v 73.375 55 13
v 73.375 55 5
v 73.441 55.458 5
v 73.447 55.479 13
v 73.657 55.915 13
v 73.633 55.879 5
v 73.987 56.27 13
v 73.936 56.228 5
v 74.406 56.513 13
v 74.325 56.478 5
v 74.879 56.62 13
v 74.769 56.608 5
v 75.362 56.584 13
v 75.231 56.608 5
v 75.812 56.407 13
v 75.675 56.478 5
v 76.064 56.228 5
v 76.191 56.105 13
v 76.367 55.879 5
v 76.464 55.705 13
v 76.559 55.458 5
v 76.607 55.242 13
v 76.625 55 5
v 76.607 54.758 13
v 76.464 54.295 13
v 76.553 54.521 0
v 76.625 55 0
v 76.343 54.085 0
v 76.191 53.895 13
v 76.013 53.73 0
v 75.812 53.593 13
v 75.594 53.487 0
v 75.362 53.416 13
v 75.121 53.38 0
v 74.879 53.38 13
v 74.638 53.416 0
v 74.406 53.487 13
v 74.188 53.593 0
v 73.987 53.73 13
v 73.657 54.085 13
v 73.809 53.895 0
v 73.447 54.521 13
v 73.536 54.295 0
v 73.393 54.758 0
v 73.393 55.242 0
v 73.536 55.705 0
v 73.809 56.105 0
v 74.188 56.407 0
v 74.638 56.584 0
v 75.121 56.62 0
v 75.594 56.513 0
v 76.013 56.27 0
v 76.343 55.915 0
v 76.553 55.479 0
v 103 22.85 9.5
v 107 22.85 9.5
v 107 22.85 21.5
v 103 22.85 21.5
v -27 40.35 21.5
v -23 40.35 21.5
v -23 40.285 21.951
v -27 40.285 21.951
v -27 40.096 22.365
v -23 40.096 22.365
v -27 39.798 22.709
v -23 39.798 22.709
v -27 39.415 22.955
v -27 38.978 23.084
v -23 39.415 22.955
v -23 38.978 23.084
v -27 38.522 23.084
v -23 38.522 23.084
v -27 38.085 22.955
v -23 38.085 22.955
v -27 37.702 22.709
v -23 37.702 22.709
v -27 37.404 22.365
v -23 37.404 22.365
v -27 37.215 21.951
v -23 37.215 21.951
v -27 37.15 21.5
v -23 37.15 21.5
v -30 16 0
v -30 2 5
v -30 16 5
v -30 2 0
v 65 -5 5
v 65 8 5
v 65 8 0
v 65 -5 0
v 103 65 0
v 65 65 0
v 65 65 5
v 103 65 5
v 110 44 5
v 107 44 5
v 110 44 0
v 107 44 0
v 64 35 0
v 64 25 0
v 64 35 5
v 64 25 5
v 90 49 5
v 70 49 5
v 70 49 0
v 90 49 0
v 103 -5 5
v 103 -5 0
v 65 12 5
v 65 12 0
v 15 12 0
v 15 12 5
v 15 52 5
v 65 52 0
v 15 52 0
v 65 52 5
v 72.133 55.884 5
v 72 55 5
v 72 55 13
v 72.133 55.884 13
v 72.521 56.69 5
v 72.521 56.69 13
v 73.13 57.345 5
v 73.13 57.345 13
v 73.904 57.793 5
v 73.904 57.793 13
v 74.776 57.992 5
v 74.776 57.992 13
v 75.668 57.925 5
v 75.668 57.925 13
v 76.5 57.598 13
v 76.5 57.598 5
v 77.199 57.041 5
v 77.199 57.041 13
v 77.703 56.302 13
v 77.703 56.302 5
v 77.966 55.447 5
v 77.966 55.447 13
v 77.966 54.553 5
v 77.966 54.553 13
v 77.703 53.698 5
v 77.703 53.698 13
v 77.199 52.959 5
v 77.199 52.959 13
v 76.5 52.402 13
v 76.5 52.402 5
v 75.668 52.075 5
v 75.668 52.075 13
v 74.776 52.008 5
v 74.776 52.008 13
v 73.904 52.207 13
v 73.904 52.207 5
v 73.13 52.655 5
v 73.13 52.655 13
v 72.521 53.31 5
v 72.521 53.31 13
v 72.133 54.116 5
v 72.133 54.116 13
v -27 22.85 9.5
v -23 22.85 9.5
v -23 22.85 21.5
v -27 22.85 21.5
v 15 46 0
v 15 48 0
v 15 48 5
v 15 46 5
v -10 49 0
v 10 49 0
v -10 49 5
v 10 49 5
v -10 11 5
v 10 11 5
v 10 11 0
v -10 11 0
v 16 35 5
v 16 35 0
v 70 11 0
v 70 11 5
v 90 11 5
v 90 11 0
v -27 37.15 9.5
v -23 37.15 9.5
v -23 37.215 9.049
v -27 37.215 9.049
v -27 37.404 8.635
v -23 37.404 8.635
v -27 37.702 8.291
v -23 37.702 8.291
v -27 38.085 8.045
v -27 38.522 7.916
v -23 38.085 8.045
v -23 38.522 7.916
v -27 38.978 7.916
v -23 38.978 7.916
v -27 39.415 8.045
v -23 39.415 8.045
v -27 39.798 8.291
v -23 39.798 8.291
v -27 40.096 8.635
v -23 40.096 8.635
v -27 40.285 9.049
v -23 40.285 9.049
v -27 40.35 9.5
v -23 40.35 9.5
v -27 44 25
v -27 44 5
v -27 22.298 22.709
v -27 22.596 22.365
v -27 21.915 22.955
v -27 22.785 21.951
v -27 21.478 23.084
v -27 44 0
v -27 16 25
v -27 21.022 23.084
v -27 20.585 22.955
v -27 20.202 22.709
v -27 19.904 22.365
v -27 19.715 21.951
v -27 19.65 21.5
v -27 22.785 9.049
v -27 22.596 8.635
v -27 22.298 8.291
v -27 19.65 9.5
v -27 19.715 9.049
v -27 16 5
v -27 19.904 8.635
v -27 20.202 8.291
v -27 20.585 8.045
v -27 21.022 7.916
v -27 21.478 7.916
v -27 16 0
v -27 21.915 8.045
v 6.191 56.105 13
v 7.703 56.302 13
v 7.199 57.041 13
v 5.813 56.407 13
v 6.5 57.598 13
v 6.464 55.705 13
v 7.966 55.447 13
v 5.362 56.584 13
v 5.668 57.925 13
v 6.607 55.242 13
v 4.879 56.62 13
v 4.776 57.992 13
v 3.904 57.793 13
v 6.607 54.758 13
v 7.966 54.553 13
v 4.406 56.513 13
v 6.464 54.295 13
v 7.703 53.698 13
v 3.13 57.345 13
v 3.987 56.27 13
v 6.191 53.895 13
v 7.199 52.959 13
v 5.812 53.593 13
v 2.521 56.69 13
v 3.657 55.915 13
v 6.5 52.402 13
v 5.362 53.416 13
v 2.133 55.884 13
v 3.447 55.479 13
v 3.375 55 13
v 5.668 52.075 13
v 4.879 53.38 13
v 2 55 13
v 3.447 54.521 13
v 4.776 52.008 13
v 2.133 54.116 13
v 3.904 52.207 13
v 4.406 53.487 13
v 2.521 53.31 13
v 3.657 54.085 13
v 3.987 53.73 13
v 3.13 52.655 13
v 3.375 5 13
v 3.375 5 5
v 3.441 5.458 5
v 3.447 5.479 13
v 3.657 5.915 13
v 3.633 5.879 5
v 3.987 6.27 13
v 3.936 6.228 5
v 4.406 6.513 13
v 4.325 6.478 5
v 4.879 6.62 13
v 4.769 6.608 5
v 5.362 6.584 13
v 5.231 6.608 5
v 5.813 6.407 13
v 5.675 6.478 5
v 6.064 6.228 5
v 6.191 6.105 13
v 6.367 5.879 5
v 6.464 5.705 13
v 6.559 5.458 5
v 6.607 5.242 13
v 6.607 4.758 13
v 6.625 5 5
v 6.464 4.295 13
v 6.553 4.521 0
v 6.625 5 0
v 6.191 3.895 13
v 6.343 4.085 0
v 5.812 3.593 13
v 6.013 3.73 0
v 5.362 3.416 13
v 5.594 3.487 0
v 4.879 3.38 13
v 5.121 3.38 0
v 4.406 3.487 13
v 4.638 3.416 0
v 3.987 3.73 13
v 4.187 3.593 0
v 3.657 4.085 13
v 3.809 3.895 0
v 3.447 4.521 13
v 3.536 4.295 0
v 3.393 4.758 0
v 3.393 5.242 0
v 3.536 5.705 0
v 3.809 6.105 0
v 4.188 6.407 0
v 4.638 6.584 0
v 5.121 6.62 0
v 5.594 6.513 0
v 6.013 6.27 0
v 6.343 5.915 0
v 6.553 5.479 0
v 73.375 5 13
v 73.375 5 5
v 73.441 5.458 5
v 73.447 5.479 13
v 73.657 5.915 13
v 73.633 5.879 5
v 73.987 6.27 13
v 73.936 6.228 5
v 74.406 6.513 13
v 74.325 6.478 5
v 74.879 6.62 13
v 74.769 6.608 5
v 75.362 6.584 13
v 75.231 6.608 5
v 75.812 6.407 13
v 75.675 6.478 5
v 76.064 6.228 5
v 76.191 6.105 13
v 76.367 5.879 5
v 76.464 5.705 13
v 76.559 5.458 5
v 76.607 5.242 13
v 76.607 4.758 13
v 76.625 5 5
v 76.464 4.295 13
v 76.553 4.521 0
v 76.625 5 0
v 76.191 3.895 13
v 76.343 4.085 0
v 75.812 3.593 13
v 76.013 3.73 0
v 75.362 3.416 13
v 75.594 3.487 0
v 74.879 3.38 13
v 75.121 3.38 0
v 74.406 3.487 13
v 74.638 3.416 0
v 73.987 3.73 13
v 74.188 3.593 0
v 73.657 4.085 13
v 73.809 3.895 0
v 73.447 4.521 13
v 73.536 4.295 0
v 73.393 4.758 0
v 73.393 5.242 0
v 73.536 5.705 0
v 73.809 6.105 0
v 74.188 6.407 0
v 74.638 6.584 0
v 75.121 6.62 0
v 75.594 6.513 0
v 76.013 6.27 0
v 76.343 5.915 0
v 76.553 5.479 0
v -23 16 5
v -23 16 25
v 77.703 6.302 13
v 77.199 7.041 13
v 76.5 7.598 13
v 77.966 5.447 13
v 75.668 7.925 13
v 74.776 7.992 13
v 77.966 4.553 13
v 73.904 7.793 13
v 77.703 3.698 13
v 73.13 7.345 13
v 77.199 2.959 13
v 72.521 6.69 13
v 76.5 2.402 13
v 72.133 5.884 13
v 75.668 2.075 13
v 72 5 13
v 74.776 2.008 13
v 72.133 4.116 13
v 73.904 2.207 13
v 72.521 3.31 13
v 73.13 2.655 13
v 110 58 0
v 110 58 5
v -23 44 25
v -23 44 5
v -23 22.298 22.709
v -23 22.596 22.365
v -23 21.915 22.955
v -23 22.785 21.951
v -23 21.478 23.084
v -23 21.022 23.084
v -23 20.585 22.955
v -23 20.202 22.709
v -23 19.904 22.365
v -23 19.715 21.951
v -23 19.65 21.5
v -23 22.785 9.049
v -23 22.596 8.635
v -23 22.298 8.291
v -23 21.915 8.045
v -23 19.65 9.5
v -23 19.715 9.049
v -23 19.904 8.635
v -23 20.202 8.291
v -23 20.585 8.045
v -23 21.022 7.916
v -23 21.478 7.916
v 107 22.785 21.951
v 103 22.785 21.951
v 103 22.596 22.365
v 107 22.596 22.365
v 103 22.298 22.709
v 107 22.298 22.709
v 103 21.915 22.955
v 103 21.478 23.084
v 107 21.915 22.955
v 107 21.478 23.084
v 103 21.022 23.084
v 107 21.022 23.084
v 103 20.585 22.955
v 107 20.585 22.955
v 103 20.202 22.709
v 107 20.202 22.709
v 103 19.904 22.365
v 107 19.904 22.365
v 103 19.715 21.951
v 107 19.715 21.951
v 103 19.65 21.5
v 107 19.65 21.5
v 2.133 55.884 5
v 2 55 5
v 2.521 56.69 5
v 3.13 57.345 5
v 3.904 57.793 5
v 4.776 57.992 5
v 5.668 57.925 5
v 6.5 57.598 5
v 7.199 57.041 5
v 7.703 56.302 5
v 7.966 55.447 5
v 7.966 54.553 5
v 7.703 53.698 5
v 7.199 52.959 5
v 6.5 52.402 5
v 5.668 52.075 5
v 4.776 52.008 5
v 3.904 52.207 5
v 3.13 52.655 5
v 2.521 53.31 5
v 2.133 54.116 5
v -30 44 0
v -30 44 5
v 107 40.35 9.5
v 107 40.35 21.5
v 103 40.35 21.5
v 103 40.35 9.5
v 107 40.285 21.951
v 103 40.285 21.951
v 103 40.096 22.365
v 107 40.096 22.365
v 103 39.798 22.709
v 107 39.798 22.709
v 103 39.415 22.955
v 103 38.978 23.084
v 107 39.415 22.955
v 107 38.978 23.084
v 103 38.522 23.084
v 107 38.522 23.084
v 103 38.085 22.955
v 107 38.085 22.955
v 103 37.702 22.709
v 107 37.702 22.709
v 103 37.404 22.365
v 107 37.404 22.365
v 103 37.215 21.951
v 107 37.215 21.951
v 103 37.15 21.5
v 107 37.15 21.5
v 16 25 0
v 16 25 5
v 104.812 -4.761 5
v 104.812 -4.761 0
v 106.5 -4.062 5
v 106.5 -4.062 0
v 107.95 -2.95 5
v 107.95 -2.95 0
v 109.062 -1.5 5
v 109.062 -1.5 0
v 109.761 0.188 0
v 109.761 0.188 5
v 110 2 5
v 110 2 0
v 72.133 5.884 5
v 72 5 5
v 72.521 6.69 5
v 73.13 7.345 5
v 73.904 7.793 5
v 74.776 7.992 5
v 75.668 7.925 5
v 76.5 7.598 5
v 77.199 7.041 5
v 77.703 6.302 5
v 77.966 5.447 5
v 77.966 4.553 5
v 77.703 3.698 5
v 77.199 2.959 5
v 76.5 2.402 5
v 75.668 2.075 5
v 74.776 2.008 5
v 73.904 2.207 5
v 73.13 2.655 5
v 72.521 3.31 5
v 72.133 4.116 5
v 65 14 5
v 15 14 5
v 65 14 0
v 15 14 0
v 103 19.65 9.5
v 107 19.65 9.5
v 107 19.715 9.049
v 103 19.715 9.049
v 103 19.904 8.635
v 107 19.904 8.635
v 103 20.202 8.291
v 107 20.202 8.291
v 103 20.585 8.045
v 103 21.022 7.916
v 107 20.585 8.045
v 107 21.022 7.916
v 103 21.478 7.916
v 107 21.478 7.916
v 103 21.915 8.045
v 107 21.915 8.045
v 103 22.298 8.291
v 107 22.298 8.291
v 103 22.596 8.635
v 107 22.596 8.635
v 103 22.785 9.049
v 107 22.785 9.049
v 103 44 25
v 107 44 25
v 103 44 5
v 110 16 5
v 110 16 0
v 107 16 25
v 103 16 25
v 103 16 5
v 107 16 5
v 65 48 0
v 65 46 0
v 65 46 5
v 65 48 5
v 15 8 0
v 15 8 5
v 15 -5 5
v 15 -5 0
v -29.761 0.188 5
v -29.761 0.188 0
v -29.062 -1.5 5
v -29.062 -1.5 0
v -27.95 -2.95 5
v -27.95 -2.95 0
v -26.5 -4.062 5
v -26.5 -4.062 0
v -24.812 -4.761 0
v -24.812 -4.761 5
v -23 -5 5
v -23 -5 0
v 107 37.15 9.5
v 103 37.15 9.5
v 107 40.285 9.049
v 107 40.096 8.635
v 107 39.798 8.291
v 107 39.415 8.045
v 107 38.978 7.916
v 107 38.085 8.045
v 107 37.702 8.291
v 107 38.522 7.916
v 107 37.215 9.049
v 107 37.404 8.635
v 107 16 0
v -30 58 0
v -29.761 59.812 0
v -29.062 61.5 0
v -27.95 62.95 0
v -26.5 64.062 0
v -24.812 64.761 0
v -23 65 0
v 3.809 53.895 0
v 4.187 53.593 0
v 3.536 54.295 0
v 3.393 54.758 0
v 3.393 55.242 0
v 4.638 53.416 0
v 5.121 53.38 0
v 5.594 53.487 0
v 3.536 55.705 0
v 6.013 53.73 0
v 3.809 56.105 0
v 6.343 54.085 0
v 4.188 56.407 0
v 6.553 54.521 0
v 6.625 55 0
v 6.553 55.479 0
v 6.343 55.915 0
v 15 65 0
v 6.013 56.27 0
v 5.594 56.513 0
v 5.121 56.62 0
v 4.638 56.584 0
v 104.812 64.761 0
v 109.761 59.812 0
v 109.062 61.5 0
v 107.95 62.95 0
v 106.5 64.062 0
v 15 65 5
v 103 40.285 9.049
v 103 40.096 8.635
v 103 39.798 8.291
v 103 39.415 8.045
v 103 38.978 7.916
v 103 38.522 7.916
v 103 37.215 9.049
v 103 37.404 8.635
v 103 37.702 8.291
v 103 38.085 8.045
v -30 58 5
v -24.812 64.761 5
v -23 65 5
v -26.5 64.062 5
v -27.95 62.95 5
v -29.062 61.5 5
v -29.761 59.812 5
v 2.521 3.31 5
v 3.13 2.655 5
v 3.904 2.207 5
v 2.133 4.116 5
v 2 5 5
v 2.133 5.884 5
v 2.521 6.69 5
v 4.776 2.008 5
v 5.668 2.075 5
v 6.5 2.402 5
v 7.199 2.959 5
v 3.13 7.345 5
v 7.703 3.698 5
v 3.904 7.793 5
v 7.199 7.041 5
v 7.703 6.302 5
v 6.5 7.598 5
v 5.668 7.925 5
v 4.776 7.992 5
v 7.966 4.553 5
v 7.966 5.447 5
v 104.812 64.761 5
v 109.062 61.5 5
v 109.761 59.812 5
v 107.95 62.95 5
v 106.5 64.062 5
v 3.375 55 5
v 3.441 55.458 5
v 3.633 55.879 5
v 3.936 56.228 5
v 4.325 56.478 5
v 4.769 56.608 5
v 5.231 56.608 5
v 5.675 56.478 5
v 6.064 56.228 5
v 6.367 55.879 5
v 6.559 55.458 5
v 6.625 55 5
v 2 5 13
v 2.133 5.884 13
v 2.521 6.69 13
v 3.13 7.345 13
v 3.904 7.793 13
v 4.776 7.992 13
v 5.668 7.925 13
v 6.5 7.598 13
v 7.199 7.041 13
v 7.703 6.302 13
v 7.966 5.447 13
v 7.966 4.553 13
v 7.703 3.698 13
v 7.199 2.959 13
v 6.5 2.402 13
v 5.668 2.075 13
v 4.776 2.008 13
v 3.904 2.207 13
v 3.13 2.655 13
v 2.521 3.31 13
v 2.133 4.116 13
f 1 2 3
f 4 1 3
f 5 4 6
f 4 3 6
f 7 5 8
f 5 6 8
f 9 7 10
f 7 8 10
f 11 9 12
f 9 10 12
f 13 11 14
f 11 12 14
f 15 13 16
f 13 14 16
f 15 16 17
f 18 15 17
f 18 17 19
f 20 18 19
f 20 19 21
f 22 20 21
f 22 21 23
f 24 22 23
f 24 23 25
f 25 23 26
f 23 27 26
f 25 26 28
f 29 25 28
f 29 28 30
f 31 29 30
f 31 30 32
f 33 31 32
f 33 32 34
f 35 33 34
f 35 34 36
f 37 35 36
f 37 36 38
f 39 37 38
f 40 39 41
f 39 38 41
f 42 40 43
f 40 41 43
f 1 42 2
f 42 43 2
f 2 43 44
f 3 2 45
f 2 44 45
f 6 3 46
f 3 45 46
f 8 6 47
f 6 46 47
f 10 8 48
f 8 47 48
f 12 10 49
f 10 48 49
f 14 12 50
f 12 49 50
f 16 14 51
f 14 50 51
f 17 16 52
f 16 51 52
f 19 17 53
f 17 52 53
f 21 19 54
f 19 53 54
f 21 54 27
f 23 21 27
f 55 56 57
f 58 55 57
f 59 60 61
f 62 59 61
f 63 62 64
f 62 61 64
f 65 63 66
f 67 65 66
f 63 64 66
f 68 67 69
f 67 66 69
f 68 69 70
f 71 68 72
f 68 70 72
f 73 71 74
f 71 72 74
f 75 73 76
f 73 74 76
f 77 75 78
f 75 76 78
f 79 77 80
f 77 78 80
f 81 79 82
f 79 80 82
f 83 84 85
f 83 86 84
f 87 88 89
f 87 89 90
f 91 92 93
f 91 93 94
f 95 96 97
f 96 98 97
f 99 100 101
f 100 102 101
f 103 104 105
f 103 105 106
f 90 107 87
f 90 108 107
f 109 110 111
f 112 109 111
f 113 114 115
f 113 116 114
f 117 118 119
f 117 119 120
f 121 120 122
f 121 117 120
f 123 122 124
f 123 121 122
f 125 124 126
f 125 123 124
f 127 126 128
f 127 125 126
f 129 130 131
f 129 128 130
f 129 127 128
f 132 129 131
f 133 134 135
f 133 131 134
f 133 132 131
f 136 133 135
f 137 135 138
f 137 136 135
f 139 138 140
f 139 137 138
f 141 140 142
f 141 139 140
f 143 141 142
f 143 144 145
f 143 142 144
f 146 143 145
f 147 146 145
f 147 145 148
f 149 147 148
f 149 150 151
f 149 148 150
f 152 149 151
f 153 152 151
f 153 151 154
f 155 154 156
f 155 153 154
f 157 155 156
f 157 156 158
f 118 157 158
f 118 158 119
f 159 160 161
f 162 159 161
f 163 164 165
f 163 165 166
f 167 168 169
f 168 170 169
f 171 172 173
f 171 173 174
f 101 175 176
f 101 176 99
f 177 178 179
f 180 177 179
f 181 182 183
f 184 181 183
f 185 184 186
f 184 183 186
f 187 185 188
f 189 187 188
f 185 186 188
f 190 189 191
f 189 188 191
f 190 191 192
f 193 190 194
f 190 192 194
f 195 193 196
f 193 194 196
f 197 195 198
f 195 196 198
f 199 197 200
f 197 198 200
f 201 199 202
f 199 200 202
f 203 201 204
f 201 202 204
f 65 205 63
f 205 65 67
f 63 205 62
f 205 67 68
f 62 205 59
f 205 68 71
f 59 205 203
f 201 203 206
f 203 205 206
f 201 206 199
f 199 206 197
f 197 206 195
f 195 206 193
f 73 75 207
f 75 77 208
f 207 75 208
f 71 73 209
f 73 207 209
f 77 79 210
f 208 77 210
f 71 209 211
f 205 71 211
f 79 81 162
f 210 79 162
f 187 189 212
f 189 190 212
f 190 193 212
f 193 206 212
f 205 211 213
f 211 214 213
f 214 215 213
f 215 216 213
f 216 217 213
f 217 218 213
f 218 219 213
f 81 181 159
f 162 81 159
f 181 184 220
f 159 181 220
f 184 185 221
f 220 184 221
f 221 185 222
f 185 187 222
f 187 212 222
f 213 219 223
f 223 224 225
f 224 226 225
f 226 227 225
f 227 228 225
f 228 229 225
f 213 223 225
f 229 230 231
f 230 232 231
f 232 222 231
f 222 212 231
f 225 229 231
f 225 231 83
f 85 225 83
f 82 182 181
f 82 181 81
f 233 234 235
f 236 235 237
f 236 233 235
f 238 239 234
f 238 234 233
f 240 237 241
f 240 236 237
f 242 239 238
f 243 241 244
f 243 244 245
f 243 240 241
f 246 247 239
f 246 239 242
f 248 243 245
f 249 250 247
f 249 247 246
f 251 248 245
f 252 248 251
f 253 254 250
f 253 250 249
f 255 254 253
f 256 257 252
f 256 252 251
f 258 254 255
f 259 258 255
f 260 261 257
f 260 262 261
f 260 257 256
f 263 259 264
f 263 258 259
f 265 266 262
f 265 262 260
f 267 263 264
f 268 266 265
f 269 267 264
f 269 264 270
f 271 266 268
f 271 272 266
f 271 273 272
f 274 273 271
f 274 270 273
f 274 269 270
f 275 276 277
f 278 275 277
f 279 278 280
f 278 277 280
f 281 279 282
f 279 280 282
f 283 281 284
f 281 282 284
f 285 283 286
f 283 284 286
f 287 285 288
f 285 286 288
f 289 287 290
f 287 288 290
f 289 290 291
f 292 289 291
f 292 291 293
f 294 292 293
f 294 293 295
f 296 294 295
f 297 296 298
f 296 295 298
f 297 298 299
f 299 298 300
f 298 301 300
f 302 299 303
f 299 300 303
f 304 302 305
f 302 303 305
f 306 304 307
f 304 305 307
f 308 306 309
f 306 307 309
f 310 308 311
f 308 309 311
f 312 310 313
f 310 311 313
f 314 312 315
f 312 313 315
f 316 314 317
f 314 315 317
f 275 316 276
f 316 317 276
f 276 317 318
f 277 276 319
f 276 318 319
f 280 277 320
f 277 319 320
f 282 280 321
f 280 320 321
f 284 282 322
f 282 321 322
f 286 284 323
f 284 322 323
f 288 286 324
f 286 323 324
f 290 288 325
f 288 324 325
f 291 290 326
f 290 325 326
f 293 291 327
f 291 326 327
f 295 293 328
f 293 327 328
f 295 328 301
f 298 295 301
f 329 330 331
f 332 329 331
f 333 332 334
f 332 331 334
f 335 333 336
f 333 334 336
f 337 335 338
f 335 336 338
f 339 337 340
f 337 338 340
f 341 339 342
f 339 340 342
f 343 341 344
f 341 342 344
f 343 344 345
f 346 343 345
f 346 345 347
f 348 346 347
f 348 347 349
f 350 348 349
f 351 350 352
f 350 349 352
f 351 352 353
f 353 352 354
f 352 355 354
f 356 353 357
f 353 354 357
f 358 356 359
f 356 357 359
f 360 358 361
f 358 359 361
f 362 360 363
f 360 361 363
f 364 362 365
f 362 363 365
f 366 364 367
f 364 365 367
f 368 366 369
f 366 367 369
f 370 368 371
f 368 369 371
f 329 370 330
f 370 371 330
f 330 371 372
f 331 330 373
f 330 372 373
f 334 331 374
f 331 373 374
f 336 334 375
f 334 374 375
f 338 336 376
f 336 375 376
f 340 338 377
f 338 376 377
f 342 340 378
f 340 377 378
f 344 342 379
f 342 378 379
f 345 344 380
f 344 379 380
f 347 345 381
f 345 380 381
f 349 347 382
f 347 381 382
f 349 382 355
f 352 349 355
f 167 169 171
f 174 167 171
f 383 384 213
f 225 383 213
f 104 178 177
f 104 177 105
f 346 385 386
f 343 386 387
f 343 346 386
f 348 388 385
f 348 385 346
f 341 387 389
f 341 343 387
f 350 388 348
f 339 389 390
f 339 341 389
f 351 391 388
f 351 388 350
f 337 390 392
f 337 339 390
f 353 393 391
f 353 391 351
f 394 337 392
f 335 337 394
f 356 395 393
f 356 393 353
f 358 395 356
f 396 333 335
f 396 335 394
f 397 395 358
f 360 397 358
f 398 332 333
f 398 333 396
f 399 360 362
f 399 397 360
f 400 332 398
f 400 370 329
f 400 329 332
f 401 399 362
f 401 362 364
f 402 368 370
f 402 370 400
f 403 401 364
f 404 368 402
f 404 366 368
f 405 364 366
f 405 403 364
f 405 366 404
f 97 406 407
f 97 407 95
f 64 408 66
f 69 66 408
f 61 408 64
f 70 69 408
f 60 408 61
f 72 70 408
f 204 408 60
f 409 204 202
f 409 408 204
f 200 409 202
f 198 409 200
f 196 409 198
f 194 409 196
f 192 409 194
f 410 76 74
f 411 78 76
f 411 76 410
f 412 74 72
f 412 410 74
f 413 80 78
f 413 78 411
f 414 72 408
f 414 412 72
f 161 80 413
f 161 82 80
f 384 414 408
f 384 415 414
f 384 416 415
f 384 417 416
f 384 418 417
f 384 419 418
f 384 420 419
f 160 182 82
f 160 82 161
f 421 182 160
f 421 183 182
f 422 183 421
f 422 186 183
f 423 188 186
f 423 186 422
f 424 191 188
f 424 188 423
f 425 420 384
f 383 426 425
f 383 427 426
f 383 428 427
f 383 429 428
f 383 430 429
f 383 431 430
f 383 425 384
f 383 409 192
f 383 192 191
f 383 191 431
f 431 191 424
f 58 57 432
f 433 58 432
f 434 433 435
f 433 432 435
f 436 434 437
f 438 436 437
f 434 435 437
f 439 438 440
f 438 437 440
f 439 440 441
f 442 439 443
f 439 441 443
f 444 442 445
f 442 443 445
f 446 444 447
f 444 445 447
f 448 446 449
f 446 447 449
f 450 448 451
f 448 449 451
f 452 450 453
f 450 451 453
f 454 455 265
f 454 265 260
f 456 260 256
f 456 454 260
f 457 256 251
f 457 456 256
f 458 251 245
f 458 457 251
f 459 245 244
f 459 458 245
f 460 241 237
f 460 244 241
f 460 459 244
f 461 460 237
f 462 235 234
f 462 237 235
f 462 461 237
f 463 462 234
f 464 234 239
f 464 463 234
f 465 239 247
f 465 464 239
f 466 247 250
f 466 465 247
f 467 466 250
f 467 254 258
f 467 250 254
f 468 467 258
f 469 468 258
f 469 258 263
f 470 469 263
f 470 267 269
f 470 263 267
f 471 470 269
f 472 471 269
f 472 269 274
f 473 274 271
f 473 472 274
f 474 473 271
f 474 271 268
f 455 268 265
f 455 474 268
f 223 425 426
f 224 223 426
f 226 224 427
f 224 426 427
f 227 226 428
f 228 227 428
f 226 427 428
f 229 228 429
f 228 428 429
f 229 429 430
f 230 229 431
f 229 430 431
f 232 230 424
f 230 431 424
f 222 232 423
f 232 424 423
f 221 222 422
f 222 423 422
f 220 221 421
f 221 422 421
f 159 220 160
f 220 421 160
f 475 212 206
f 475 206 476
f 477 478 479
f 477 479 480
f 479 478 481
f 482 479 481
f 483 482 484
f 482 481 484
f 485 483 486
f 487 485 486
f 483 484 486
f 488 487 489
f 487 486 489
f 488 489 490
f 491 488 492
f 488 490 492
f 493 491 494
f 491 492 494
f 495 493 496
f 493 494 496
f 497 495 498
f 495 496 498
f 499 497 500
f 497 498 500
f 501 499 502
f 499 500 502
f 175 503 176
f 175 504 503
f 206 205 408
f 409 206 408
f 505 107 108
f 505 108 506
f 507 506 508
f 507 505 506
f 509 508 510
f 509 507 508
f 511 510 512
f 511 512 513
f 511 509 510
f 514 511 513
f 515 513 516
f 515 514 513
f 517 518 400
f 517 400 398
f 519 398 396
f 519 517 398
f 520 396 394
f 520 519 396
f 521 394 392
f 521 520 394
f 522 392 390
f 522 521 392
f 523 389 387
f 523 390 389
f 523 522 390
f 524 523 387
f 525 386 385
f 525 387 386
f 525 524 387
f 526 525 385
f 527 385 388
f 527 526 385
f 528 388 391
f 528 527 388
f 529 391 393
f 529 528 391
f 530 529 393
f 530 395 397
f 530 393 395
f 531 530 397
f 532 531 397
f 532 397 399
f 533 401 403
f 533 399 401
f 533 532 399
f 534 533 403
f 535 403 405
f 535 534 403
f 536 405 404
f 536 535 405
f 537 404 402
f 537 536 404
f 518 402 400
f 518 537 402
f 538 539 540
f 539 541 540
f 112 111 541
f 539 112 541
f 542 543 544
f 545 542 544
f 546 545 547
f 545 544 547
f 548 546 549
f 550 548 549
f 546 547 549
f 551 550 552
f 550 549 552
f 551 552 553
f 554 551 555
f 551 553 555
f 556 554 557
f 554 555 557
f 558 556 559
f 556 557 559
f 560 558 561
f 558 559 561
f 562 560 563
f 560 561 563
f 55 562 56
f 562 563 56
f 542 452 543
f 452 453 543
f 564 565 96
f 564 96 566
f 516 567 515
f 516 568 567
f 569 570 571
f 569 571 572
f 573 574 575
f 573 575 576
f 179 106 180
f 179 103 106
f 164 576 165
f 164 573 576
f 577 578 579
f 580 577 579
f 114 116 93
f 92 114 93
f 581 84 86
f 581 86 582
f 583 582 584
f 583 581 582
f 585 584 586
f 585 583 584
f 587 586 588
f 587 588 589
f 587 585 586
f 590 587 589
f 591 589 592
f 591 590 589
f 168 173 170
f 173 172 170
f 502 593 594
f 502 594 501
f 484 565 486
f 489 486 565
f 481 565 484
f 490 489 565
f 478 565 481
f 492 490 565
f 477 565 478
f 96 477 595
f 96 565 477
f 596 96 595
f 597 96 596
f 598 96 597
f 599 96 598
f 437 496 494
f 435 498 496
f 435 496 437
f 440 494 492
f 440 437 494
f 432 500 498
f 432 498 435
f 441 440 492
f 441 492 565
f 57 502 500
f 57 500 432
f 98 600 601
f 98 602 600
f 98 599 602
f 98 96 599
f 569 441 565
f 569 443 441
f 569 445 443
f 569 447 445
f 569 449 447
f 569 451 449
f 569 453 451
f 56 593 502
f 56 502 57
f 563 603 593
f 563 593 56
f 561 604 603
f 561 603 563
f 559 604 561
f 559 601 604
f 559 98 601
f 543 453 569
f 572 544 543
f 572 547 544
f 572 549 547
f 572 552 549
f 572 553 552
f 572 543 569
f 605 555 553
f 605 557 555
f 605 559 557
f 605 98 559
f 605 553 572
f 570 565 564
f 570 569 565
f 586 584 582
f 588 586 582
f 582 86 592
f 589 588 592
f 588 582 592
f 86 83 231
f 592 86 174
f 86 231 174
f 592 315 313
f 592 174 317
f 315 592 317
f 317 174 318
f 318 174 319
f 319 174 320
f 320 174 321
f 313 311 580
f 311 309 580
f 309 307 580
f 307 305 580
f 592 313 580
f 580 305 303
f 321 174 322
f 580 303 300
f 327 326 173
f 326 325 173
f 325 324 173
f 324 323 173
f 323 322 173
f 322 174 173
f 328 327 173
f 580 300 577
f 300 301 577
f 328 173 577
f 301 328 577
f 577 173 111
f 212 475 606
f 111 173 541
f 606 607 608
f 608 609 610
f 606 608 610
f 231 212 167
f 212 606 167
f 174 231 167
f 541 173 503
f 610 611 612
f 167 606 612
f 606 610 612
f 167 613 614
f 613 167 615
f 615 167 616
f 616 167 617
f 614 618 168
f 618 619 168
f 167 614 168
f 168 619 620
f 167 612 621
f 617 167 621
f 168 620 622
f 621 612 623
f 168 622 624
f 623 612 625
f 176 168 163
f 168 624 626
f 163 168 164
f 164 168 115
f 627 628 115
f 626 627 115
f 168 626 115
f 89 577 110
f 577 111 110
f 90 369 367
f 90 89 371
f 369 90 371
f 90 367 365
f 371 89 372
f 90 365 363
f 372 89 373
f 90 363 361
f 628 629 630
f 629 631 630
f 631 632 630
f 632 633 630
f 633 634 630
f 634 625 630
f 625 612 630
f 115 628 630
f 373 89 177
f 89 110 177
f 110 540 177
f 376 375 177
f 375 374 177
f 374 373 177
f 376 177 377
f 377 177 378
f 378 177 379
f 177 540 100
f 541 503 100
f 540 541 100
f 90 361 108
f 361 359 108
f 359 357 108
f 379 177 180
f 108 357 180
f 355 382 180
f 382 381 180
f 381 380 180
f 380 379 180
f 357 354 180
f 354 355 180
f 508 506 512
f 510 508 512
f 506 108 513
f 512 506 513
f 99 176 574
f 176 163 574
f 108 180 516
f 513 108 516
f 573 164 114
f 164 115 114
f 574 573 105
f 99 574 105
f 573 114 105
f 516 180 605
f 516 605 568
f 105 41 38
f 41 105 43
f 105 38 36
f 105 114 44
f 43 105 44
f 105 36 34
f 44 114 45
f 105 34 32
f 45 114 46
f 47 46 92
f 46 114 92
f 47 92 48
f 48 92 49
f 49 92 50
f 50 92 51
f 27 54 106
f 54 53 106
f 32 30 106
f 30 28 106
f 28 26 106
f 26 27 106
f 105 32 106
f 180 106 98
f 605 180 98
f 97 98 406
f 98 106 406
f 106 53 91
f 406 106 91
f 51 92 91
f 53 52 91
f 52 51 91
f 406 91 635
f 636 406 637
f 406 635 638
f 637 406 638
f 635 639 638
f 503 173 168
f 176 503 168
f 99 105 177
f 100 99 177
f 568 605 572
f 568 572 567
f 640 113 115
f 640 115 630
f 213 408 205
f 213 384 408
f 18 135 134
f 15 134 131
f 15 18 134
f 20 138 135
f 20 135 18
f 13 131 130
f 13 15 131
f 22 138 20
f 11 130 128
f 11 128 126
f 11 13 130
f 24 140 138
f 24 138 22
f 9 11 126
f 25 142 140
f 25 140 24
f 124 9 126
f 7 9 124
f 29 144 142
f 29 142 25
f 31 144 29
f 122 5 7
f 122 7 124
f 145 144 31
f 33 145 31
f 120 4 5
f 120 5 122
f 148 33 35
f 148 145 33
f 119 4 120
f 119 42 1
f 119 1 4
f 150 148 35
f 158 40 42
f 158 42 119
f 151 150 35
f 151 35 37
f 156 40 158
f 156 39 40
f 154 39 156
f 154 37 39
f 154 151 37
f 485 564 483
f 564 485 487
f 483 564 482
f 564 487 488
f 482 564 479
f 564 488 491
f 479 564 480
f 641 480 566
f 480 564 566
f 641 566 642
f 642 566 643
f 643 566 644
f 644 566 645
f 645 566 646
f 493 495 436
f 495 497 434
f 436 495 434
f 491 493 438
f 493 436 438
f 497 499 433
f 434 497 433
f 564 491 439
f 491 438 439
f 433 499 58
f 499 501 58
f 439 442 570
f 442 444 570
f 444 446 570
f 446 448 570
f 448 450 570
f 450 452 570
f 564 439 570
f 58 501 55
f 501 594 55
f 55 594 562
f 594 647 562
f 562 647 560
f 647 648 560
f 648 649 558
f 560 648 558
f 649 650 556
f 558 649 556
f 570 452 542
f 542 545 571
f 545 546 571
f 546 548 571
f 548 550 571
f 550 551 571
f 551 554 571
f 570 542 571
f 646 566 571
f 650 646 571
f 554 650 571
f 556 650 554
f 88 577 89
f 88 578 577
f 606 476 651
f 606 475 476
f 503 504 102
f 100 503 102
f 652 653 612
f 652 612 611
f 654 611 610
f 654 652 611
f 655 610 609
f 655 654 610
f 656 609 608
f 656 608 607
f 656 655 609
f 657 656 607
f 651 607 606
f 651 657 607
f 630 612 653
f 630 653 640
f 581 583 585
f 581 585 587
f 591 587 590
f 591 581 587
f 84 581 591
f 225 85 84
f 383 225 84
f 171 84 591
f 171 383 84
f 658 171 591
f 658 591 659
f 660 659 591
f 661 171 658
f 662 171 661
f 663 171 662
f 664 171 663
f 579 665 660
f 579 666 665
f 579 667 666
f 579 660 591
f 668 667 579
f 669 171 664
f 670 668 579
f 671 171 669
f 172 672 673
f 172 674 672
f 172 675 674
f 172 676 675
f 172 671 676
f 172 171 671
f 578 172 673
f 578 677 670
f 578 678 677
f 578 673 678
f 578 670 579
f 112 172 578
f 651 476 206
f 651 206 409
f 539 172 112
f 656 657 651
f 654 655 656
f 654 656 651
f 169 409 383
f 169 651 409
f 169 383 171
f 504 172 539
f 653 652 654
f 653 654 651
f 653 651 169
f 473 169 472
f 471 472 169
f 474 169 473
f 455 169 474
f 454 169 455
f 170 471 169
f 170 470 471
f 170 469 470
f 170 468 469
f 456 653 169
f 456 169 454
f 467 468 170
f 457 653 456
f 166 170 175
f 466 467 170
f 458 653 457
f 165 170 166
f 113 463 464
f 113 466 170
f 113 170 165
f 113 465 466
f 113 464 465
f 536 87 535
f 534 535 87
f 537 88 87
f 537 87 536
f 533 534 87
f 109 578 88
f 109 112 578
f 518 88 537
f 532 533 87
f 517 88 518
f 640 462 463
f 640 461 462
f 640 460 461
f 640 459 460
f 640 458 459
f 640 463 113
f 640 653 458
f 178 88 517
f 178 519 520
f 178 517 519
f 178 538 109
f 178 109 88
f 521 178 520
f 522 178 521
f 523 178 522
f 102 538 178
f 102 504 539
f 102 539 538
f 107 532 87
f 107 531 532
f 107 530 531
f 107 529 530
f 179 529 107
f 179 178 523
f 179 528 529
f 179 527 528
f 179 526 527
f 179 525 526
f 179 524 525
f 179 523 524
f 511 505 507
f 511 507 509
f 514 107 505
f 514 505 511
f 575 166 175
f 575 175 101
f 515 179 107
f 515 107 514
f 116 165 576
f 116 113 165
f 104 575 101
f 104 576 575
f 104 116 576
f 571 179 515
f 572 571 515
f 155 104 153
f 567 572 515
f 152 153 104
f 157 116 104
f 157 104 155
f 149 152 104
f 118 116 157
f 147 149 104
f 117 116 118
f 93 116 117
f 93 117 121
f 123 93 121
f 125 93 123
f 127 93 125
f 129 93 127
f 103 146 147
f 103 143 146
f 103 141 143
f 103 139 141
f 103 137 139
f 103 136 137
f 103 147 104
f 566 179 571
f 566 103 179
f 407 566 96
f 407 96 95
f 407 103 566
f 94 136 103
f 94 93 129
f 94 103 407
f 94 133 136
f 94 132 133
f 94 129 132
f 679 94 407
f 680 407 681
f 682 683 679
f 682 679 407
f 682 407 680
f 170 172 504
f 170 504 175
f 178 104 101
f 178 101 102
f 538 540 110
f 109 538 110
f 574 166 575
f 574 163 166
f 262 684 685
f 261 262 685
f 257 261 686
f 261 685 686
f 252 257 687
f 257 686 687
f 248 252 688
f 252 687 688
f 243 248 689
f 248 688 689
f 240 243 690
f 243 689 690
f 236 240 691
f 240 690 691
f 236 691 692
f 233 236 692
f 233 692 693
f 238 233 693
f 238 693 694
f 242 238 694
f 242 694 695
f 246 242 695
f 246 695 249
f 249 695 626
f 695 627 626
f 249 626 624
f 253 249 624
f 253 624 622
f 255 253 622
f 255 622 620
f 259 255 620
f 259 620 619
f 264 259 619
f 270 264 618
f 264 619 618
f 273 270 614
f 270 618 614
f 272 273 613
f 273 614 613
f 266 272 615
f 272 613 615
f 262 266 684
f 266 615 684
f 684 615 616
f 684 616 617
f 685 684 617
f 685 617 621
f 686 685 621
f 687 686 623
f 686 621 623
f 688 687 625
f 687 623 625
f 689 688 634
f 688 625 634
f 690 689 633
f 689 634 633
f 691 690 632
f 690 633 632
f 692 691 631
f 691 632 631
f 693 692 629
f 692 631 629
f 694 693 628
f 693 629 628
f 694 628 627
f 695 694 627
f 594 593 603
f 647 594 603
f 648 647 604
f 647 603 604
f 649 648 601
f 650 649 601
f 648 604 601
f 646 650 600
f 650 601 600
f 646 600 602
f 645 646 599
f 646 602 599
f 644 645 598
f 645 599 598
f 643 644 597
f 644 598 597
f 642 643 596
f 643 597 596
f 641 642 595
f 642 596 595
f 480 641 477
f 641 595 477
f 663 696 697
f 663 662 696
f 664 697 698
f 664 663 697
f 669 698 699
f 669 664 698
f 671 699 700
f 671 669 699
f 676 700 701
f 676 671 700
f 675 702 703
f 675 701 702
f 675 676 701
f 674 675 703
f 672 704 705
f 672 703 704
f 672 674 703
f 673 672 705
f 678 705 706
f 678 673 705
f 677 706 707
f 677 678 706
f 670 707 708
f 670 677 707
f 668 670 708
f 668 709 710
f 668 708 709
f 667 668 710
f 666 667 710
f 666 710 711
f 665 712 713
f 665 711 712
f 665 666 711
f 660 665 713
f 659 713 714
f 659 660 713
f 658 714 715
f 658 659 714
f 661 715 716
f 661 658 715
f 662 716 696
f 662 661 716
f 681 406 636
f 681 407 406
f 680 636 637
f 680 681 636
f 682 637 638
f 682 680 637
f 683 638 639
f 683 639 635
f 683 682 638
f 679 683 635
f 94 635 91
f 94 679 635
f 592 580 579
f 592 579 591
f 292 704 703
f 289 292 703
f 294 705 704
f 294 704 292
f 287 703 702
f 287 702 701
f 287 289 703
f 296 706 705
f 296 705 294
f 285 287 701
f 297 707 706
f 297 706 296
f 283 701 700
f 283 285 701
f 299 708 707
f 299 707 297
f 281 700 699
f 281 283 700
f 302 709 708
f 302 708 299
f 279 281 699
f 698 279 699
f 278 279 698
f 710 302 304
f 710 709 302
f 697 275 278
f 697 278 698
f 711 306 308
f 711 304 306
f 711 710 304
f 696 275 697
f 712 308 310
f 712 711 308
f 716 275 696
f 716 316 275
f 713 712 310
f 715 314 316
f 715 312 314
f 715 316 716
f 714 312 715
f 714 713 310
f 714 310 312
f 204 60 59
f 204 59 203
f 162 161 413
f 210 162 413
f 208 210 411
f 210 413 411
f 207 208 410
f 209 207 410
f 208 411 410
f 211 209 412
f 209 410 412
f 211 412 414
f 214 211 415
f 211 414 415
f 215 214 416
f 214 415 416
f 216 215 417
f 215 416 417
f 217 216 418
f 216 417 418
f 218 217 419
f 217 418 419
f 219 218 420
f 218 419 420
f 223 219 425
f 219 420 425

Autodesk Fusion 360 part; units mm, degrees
sketch "Boceto1" plane through (0, 0, 0) normal (0, 0, 1) x (1, 0, 0)
  line L0 (0, 0) -> (80, 0) construction
  line L1 (80, 0) -> (80, 60) construction
  line L2 (80, 60) -> (0, 60) construction
  line L3 (0, 60) -> (0, 0) construction
  circle A0 centre (5, 55) radius 1.625
  circle A1 centre (75, 55) radius 1.625
  line L4 (110, -5) -> (-30, -5)
  line L5 (-30, -5) -> (-30, 65)
  line L6 (-30, 65) -> (110, 65)
  line L7 (110, 65) -> (110, -5)
  line L8 (15, 46) -> (65, 46)
  line L9 (65, 46) -> (65, 48)
  line L10 (65, 48) -> (15, 48)
  line L11 (15, 48) -> (15, 46)
  line L12 (-30, 30) -> (115, 30)
  line L13 (110, 30) -> (107, 30)
  line L14 (107, 30) -> (107, 44)
  line L15 (107, 44) -> (110, 44)
  line L16 (110, 44) -> (110, 30)
  line L17 (110, 16) -> (110, 30)
  line L18 (110, 30) -> (107, 30)
  line L19 (107, 16) -> (110, 16)
  line L20 (107, 30) -> (107, 16)
  line L21 (40, 65) -> (40, -5)
  circle A2 centre (5, 5) radius 1.625
  circle A3 centre (75, 5) radius 1.625
  line L22 (-30, 44) -> (-30, 30)
  line L23 (-30, 30) -> (-27, 30)
  line L24 (-27, 30) -> (-27, 44)
  line L25 (-27, 44) -> (-30, 44)
  line L26 (-30, 16) -> (-30, 30)
  line L27 (-30, 30) -> (-27, 30)
  line L28 (-27, 16) -> (-30, 16)
  line L29 (-27, 30) -> (-27, 16)
  line L30 (65, 12) -> (15, 12)
  line L31 (15, 12) -> (15, 14)
  line L32 (15, 14) -> (65, 14)
  line L33 (65, 14) -> (65, 12)
  dimension "d1" = 80
  dimension "d2" = 60
  dimension "d3" = 5
  dimension "d4" = 70
  dimension "d8" = 3.25
  dimension "d16" = 70
  dimension "d17" = 140
  dimension "d19" = 30
  dimension "d20" = 5
  dimension "d29" = 7
  dimension "d31" = 2
  dimension "d34" = 50
  dimension "d37" = 14
  dimension "d38" = 3
  dimension "d39" = 5
extrude "Extruir1" add sketch "Boceto1" along normal blind 5 contours L4 L7 L12 L19 L20 L21 L30 L32 L33 | L4 L5 L12 L21 L28 L29 L30 L31 L32 | L6 L7 L8 L9 L10 L12 L14 L15 L21 | L5 L6 L8 L10 L11 L12 L21 L24 L25
sketch "Boceto4" plane through (0, 0, 5) normal (0, 0, 1) x (-1, 0, 0)
  line L0 (-15, -14) -> (-65, -14)
  line L1 (-65, -14) -> (-65, -12)
  line L2 (-65, -12) -> (-15, -12)
  line L3 (-15, -12) -> (-15, -14)
  circle A0 centre (-5, -5) radius 1.625
  circle A1 centre (-75, -55) radius 1.625
  circle A2 centre (-75, -5) radius 1.625
  circle A3 centre (-5, -55) radius 1.625
  line L4 (-15, -46) -> (-15, -48)
  line L5 (-15, -48) -> (-65, -48)
  line L6 (-65, -48) -> (-65, -46)
  line L7 (-65, -46) -> (-15, -46)
  line L8 (27, -44) -> (27, -16)
  line L9 (27, -16) -> (30, -16)
  line L10 (30, -16) -> (30, 5)
  line L11 (30, 5) -> (-110, 5)
  line L12 (-110, 5) -> (-110, -16)
  line L13 (-110, -16) -> (-107, -16)
  line L14 (-107, -16) -> (-107, -44)
  line L15 (-107, -44) -> (-110, -44)
  line L16 (-110, -44) -> (-110, -65)
  line L17 (-110, -65) -> (30, -65)
  line L18 (30, -65) -> (30, -44)
  line L19 (30, -44) -> (27, -44)
  line L20 (-107, -44) -> (-103, -44)
  line L21 (-103, -44) -> (-103, -16)
  line L22 (-103, -16) -> (-107, -16)
  line L23 (-107, -16) -> (-107, -44)
  line L24 (-40, -65) -> (-40, 5)
  line L25 (27, -30) -> (-107, -30)
  line L26 (27, -16) -> (27, -44)
  line L27 (27, -44) -> (23, -44)
  line L28 (23, -44) -> (23, -16)
  line L29 (23, -16) -> (27, -16)
  circle A4 centre (-5, -55) radius 3
  circle A5 centre (-75, -55) radius 3
  circle A6 centre (-5, -5) radius 3
  circle A7 centre (-75, -5) radius 3
  dimension "d42" = 4
  dimension "d58" = 6
extrude "Extruir3" add sketch "Boceto4" along normal blind 20 contours L8 L25 L26 L28 L29 | L8 L25 L26 L27 L28 | L14 L21 L22 L23 L25 | L14 L20 L21 L23 L25
extrude "Extruir2" add sketch "Boceto4" along normal blind 10 contours L8 L25 L26 L28 L29 | L8 L25 L26 L27 L28 | L14 L21 L22 L23 L25 | L14 L20 L21 L23 L25
sketch "Boceto5" plane through (107, 0, 0) normal (1, 0, 0) x (0, 1, 0)
  line L0 (16, 0) -> (44, 0)
  line L1 (44, 0) -> (44, 5)
  line L2 (44, 5) -> (44, 25)
  line L3 (16, 25) -> (16, 5)
  line L4 (16, 5) -> (16, 0)
  line L5 (30, 25) -> (30, 0)
  line L6 (44, 25) -> (16, 25)
  line L7 (19.65, 21.5) -> (19.65, 9.5)
  arc A0 (19.65, 9.5) -> (22.85, 9.5) centre (21.25, 9.5) ccw
  line L8 (22.85, 9.5) -> (22.85, 21.5)
  arc A1 (22.85, 21.5) -> (19.65, 21.5) centre (21.25, 21.5) ccw
  line L9 (21.25, 21.5) -> (21.25, 9.5) construction
  arc A2 (37.15, 9.5) -> (40.35, 9.5) centre (38.75, 9.5) ccw
  line L10 (37.15, 9.5) -> (37.15, 21.5)
  arc A3 (40.35, 21.5) -> (37.15, 21.5) centre (38.75, 21.5) ccw
  line L11 (40.35, 21.5) -> (40.35, 9.5)
  dimension "d52" = 3.2
  dimension "d53" = 12
  dimension "d54" = 8.75
  dimension "d55" = 3.5
sketch "Boceto2" plane through (0, 0, 0) normal (0, 0, 1) x (1, 0, 0)
sketch "Boceto3" plane through (0, 0, 0) normal (0, 0, 1) x (1, 0, 0)
  point P0 (5, 55)
extrude "Extruir4" cut sketch "Boceto5" against normal blind 155 contours L7 A0 L8 A1 | A2 L10 A3 L11
extrude "Extruir5" add sketch "Boceto4" along normal blind 8 contours A4 | A5 | A6 | A7
sketch "Boceto6" plane through (0, 0, 5) normal (0, 0, 1) x (-1, 0, 0)
  line L0 (10, -30) -> (-10, -30)
  line L1 (-10, -30) -> (-10, -49)
  line L2 (-10, -49) -> (10, -49)
  line L3 (10, -49) -> (10, -30)
  line L4 (-15, -65) -> (-40, -65)
  line L5 (-40, -65) -> (-40, -52)
  line L6 (-40, -52) -> (-15, -52)
  line L7 (-15, -52) -> (-15, -65)
  line L8 (-40, -65) -> (-40, 5)
  line L9 (-90, -49) -> (-90, -30)
  line L10 (-90, -30) -> (-70, -30)
  line L11 (-70, -30) -> (-70, -49)
  line L12 (-70, -49) -> (-90, -49)
  line L13 (27, -30) -> (-107, -30)
  line L14 (-10, -30) -> (-10, -11)
  line L15 (-10, -11) -> (10, -11)
  line L16 (10, -11) -> (10, -30)
  line L17 (10, -30) -> (-10, -30)
  line L18 (-70, -30) -> (-70, -11)
  line L19 (-70, -11) -> (-90, -11)
  line L20 (-90, -11) -> (-90, -30)
  line L21 (-90, -30) -> (-70, -30)
  line L22 (-65, -65) -> (-40, -65)
  line L23 (-40, -65) -> (-40, -52)
  line L24 (-40, -52) -> (-65, -52)
  line L25 (-65, -52) -> (-65, -65)
  line L26 (-15, 5) -> (-40, 5)
  line L27 (-40, 5) -> (-40, -8)
  line L28 (-40, -8) -> (-15, -8)
  line L29 (-15, -8) -> (-15, 5)
  line L30 (-40, -8) -> (-65, -8)
  line L31 (-65, -8) -> (-65, 5)
  line L32 (-65, 5) -> (-40, 5)
  line L33 (-40, 5) -> (-40, -8)
  line L34 (-40, -30) -> (-16, -30)
  line L35 (-16, -30) -> (-16, -35)
  line L36 (-16, -35) -> (-40, -35)
  line L37 (-40, -35) -> (-40, -30)
  line L38 (-40, -30) -> (-64, -30)
  line L39 (-64, -30) -> (-64, -35)
  line L40 (-40, -35) -> (-40, -30)
  line L41 (-64, -35) -> (-40, -35)
  line L42 (-40, -30) -> (-16, -30)
  line L43 (-16, -30) -> (-16, -25)
  line L44 (-16, -25) -> (-40, -25)
  line L45 (-40, -25) -> (-40, -30)
  line L46 (-40, -30) -> (-64, -30)
  line L47 (-64, -30) -> (-64, -25)
  line L48 (-64, -25) -> (-40, -25)
  line L49 (-40, -25) -> (-40, -30)
  arc A0 (-103, 5) -> (-110, -2) centre (-103, -2) ccw
  line L50 (-103, 5) -> (-110, 5)
  line L51 (-110, 5) -> (-110, -2)
  line L52 (30, 5) -> (30, -2)
  line L53 (23, 5) -> (30, 5)
  arc A1 (30, -2) -> (23, 5) centre (23, -2) ccw
  line L54 (-110, -65) -> (-110, -58)
  line L55 (-103, -65) -> (-110, -65)
  arc A2 (-110, -58) -> (-103, -65) centre (-103, -58) ccw
  line L56 (30, -65) -> (30, -58)
  arc A3 (23, -65) -> (30, -58) centre (23, -58) ccw
  line L57 (23, -65) -> (30, -65)
  point P0 (-5, -55)
  point P1 (-75, -5)
  point P2 (-110, 5)
  dimension "d61" = 15
  dimension "d62" = 6
  dimension "d63" = 19
  dimension "d64" = 20
  dimension "d65" = 25
  dimension "d66" = 13
  dimension "d67" = 24
  dimension "d68" = 5
  dimension "d72" = 7
  dimension "d73" = 3
extrude "Extruir6" cut sketch "Boceto6" against normal blind 25 contours L0 L1 L2 L3 L13 L17 | L4 L5 L6 L7 L8 L23 | L5 L8 L22 L23 L24 L25 | L9 L10 L11 L12 L13 L21 | L10 L13 L18 L19 L20 L21 | L8 L27 L30 L31 L32 L33 | L8 L26 L27 L28 L29 L33 | L8 L13 L34 L35 L36 L37 L40 L42 | L8 L13 L34 L42 L43 L44 L45 L49 | L0 L13 L14 L15 L16 L17 | L8 L13 L38 L45 L46 L47 L48 L49 | L8 L13 L37 L38 L39 L40 L41 L46
extrude "Extruir7" cut sketch "Boceto6" against normal blind 15 contours A0 L50 L51 | L52 L53 A1 | L54 L55 A2 | L56 A3 L57
equation "d37 = ( 28 / 2 ) * 1 mm"
equation "d54 = ( 17.5 / 2 ) * 1 mm"
